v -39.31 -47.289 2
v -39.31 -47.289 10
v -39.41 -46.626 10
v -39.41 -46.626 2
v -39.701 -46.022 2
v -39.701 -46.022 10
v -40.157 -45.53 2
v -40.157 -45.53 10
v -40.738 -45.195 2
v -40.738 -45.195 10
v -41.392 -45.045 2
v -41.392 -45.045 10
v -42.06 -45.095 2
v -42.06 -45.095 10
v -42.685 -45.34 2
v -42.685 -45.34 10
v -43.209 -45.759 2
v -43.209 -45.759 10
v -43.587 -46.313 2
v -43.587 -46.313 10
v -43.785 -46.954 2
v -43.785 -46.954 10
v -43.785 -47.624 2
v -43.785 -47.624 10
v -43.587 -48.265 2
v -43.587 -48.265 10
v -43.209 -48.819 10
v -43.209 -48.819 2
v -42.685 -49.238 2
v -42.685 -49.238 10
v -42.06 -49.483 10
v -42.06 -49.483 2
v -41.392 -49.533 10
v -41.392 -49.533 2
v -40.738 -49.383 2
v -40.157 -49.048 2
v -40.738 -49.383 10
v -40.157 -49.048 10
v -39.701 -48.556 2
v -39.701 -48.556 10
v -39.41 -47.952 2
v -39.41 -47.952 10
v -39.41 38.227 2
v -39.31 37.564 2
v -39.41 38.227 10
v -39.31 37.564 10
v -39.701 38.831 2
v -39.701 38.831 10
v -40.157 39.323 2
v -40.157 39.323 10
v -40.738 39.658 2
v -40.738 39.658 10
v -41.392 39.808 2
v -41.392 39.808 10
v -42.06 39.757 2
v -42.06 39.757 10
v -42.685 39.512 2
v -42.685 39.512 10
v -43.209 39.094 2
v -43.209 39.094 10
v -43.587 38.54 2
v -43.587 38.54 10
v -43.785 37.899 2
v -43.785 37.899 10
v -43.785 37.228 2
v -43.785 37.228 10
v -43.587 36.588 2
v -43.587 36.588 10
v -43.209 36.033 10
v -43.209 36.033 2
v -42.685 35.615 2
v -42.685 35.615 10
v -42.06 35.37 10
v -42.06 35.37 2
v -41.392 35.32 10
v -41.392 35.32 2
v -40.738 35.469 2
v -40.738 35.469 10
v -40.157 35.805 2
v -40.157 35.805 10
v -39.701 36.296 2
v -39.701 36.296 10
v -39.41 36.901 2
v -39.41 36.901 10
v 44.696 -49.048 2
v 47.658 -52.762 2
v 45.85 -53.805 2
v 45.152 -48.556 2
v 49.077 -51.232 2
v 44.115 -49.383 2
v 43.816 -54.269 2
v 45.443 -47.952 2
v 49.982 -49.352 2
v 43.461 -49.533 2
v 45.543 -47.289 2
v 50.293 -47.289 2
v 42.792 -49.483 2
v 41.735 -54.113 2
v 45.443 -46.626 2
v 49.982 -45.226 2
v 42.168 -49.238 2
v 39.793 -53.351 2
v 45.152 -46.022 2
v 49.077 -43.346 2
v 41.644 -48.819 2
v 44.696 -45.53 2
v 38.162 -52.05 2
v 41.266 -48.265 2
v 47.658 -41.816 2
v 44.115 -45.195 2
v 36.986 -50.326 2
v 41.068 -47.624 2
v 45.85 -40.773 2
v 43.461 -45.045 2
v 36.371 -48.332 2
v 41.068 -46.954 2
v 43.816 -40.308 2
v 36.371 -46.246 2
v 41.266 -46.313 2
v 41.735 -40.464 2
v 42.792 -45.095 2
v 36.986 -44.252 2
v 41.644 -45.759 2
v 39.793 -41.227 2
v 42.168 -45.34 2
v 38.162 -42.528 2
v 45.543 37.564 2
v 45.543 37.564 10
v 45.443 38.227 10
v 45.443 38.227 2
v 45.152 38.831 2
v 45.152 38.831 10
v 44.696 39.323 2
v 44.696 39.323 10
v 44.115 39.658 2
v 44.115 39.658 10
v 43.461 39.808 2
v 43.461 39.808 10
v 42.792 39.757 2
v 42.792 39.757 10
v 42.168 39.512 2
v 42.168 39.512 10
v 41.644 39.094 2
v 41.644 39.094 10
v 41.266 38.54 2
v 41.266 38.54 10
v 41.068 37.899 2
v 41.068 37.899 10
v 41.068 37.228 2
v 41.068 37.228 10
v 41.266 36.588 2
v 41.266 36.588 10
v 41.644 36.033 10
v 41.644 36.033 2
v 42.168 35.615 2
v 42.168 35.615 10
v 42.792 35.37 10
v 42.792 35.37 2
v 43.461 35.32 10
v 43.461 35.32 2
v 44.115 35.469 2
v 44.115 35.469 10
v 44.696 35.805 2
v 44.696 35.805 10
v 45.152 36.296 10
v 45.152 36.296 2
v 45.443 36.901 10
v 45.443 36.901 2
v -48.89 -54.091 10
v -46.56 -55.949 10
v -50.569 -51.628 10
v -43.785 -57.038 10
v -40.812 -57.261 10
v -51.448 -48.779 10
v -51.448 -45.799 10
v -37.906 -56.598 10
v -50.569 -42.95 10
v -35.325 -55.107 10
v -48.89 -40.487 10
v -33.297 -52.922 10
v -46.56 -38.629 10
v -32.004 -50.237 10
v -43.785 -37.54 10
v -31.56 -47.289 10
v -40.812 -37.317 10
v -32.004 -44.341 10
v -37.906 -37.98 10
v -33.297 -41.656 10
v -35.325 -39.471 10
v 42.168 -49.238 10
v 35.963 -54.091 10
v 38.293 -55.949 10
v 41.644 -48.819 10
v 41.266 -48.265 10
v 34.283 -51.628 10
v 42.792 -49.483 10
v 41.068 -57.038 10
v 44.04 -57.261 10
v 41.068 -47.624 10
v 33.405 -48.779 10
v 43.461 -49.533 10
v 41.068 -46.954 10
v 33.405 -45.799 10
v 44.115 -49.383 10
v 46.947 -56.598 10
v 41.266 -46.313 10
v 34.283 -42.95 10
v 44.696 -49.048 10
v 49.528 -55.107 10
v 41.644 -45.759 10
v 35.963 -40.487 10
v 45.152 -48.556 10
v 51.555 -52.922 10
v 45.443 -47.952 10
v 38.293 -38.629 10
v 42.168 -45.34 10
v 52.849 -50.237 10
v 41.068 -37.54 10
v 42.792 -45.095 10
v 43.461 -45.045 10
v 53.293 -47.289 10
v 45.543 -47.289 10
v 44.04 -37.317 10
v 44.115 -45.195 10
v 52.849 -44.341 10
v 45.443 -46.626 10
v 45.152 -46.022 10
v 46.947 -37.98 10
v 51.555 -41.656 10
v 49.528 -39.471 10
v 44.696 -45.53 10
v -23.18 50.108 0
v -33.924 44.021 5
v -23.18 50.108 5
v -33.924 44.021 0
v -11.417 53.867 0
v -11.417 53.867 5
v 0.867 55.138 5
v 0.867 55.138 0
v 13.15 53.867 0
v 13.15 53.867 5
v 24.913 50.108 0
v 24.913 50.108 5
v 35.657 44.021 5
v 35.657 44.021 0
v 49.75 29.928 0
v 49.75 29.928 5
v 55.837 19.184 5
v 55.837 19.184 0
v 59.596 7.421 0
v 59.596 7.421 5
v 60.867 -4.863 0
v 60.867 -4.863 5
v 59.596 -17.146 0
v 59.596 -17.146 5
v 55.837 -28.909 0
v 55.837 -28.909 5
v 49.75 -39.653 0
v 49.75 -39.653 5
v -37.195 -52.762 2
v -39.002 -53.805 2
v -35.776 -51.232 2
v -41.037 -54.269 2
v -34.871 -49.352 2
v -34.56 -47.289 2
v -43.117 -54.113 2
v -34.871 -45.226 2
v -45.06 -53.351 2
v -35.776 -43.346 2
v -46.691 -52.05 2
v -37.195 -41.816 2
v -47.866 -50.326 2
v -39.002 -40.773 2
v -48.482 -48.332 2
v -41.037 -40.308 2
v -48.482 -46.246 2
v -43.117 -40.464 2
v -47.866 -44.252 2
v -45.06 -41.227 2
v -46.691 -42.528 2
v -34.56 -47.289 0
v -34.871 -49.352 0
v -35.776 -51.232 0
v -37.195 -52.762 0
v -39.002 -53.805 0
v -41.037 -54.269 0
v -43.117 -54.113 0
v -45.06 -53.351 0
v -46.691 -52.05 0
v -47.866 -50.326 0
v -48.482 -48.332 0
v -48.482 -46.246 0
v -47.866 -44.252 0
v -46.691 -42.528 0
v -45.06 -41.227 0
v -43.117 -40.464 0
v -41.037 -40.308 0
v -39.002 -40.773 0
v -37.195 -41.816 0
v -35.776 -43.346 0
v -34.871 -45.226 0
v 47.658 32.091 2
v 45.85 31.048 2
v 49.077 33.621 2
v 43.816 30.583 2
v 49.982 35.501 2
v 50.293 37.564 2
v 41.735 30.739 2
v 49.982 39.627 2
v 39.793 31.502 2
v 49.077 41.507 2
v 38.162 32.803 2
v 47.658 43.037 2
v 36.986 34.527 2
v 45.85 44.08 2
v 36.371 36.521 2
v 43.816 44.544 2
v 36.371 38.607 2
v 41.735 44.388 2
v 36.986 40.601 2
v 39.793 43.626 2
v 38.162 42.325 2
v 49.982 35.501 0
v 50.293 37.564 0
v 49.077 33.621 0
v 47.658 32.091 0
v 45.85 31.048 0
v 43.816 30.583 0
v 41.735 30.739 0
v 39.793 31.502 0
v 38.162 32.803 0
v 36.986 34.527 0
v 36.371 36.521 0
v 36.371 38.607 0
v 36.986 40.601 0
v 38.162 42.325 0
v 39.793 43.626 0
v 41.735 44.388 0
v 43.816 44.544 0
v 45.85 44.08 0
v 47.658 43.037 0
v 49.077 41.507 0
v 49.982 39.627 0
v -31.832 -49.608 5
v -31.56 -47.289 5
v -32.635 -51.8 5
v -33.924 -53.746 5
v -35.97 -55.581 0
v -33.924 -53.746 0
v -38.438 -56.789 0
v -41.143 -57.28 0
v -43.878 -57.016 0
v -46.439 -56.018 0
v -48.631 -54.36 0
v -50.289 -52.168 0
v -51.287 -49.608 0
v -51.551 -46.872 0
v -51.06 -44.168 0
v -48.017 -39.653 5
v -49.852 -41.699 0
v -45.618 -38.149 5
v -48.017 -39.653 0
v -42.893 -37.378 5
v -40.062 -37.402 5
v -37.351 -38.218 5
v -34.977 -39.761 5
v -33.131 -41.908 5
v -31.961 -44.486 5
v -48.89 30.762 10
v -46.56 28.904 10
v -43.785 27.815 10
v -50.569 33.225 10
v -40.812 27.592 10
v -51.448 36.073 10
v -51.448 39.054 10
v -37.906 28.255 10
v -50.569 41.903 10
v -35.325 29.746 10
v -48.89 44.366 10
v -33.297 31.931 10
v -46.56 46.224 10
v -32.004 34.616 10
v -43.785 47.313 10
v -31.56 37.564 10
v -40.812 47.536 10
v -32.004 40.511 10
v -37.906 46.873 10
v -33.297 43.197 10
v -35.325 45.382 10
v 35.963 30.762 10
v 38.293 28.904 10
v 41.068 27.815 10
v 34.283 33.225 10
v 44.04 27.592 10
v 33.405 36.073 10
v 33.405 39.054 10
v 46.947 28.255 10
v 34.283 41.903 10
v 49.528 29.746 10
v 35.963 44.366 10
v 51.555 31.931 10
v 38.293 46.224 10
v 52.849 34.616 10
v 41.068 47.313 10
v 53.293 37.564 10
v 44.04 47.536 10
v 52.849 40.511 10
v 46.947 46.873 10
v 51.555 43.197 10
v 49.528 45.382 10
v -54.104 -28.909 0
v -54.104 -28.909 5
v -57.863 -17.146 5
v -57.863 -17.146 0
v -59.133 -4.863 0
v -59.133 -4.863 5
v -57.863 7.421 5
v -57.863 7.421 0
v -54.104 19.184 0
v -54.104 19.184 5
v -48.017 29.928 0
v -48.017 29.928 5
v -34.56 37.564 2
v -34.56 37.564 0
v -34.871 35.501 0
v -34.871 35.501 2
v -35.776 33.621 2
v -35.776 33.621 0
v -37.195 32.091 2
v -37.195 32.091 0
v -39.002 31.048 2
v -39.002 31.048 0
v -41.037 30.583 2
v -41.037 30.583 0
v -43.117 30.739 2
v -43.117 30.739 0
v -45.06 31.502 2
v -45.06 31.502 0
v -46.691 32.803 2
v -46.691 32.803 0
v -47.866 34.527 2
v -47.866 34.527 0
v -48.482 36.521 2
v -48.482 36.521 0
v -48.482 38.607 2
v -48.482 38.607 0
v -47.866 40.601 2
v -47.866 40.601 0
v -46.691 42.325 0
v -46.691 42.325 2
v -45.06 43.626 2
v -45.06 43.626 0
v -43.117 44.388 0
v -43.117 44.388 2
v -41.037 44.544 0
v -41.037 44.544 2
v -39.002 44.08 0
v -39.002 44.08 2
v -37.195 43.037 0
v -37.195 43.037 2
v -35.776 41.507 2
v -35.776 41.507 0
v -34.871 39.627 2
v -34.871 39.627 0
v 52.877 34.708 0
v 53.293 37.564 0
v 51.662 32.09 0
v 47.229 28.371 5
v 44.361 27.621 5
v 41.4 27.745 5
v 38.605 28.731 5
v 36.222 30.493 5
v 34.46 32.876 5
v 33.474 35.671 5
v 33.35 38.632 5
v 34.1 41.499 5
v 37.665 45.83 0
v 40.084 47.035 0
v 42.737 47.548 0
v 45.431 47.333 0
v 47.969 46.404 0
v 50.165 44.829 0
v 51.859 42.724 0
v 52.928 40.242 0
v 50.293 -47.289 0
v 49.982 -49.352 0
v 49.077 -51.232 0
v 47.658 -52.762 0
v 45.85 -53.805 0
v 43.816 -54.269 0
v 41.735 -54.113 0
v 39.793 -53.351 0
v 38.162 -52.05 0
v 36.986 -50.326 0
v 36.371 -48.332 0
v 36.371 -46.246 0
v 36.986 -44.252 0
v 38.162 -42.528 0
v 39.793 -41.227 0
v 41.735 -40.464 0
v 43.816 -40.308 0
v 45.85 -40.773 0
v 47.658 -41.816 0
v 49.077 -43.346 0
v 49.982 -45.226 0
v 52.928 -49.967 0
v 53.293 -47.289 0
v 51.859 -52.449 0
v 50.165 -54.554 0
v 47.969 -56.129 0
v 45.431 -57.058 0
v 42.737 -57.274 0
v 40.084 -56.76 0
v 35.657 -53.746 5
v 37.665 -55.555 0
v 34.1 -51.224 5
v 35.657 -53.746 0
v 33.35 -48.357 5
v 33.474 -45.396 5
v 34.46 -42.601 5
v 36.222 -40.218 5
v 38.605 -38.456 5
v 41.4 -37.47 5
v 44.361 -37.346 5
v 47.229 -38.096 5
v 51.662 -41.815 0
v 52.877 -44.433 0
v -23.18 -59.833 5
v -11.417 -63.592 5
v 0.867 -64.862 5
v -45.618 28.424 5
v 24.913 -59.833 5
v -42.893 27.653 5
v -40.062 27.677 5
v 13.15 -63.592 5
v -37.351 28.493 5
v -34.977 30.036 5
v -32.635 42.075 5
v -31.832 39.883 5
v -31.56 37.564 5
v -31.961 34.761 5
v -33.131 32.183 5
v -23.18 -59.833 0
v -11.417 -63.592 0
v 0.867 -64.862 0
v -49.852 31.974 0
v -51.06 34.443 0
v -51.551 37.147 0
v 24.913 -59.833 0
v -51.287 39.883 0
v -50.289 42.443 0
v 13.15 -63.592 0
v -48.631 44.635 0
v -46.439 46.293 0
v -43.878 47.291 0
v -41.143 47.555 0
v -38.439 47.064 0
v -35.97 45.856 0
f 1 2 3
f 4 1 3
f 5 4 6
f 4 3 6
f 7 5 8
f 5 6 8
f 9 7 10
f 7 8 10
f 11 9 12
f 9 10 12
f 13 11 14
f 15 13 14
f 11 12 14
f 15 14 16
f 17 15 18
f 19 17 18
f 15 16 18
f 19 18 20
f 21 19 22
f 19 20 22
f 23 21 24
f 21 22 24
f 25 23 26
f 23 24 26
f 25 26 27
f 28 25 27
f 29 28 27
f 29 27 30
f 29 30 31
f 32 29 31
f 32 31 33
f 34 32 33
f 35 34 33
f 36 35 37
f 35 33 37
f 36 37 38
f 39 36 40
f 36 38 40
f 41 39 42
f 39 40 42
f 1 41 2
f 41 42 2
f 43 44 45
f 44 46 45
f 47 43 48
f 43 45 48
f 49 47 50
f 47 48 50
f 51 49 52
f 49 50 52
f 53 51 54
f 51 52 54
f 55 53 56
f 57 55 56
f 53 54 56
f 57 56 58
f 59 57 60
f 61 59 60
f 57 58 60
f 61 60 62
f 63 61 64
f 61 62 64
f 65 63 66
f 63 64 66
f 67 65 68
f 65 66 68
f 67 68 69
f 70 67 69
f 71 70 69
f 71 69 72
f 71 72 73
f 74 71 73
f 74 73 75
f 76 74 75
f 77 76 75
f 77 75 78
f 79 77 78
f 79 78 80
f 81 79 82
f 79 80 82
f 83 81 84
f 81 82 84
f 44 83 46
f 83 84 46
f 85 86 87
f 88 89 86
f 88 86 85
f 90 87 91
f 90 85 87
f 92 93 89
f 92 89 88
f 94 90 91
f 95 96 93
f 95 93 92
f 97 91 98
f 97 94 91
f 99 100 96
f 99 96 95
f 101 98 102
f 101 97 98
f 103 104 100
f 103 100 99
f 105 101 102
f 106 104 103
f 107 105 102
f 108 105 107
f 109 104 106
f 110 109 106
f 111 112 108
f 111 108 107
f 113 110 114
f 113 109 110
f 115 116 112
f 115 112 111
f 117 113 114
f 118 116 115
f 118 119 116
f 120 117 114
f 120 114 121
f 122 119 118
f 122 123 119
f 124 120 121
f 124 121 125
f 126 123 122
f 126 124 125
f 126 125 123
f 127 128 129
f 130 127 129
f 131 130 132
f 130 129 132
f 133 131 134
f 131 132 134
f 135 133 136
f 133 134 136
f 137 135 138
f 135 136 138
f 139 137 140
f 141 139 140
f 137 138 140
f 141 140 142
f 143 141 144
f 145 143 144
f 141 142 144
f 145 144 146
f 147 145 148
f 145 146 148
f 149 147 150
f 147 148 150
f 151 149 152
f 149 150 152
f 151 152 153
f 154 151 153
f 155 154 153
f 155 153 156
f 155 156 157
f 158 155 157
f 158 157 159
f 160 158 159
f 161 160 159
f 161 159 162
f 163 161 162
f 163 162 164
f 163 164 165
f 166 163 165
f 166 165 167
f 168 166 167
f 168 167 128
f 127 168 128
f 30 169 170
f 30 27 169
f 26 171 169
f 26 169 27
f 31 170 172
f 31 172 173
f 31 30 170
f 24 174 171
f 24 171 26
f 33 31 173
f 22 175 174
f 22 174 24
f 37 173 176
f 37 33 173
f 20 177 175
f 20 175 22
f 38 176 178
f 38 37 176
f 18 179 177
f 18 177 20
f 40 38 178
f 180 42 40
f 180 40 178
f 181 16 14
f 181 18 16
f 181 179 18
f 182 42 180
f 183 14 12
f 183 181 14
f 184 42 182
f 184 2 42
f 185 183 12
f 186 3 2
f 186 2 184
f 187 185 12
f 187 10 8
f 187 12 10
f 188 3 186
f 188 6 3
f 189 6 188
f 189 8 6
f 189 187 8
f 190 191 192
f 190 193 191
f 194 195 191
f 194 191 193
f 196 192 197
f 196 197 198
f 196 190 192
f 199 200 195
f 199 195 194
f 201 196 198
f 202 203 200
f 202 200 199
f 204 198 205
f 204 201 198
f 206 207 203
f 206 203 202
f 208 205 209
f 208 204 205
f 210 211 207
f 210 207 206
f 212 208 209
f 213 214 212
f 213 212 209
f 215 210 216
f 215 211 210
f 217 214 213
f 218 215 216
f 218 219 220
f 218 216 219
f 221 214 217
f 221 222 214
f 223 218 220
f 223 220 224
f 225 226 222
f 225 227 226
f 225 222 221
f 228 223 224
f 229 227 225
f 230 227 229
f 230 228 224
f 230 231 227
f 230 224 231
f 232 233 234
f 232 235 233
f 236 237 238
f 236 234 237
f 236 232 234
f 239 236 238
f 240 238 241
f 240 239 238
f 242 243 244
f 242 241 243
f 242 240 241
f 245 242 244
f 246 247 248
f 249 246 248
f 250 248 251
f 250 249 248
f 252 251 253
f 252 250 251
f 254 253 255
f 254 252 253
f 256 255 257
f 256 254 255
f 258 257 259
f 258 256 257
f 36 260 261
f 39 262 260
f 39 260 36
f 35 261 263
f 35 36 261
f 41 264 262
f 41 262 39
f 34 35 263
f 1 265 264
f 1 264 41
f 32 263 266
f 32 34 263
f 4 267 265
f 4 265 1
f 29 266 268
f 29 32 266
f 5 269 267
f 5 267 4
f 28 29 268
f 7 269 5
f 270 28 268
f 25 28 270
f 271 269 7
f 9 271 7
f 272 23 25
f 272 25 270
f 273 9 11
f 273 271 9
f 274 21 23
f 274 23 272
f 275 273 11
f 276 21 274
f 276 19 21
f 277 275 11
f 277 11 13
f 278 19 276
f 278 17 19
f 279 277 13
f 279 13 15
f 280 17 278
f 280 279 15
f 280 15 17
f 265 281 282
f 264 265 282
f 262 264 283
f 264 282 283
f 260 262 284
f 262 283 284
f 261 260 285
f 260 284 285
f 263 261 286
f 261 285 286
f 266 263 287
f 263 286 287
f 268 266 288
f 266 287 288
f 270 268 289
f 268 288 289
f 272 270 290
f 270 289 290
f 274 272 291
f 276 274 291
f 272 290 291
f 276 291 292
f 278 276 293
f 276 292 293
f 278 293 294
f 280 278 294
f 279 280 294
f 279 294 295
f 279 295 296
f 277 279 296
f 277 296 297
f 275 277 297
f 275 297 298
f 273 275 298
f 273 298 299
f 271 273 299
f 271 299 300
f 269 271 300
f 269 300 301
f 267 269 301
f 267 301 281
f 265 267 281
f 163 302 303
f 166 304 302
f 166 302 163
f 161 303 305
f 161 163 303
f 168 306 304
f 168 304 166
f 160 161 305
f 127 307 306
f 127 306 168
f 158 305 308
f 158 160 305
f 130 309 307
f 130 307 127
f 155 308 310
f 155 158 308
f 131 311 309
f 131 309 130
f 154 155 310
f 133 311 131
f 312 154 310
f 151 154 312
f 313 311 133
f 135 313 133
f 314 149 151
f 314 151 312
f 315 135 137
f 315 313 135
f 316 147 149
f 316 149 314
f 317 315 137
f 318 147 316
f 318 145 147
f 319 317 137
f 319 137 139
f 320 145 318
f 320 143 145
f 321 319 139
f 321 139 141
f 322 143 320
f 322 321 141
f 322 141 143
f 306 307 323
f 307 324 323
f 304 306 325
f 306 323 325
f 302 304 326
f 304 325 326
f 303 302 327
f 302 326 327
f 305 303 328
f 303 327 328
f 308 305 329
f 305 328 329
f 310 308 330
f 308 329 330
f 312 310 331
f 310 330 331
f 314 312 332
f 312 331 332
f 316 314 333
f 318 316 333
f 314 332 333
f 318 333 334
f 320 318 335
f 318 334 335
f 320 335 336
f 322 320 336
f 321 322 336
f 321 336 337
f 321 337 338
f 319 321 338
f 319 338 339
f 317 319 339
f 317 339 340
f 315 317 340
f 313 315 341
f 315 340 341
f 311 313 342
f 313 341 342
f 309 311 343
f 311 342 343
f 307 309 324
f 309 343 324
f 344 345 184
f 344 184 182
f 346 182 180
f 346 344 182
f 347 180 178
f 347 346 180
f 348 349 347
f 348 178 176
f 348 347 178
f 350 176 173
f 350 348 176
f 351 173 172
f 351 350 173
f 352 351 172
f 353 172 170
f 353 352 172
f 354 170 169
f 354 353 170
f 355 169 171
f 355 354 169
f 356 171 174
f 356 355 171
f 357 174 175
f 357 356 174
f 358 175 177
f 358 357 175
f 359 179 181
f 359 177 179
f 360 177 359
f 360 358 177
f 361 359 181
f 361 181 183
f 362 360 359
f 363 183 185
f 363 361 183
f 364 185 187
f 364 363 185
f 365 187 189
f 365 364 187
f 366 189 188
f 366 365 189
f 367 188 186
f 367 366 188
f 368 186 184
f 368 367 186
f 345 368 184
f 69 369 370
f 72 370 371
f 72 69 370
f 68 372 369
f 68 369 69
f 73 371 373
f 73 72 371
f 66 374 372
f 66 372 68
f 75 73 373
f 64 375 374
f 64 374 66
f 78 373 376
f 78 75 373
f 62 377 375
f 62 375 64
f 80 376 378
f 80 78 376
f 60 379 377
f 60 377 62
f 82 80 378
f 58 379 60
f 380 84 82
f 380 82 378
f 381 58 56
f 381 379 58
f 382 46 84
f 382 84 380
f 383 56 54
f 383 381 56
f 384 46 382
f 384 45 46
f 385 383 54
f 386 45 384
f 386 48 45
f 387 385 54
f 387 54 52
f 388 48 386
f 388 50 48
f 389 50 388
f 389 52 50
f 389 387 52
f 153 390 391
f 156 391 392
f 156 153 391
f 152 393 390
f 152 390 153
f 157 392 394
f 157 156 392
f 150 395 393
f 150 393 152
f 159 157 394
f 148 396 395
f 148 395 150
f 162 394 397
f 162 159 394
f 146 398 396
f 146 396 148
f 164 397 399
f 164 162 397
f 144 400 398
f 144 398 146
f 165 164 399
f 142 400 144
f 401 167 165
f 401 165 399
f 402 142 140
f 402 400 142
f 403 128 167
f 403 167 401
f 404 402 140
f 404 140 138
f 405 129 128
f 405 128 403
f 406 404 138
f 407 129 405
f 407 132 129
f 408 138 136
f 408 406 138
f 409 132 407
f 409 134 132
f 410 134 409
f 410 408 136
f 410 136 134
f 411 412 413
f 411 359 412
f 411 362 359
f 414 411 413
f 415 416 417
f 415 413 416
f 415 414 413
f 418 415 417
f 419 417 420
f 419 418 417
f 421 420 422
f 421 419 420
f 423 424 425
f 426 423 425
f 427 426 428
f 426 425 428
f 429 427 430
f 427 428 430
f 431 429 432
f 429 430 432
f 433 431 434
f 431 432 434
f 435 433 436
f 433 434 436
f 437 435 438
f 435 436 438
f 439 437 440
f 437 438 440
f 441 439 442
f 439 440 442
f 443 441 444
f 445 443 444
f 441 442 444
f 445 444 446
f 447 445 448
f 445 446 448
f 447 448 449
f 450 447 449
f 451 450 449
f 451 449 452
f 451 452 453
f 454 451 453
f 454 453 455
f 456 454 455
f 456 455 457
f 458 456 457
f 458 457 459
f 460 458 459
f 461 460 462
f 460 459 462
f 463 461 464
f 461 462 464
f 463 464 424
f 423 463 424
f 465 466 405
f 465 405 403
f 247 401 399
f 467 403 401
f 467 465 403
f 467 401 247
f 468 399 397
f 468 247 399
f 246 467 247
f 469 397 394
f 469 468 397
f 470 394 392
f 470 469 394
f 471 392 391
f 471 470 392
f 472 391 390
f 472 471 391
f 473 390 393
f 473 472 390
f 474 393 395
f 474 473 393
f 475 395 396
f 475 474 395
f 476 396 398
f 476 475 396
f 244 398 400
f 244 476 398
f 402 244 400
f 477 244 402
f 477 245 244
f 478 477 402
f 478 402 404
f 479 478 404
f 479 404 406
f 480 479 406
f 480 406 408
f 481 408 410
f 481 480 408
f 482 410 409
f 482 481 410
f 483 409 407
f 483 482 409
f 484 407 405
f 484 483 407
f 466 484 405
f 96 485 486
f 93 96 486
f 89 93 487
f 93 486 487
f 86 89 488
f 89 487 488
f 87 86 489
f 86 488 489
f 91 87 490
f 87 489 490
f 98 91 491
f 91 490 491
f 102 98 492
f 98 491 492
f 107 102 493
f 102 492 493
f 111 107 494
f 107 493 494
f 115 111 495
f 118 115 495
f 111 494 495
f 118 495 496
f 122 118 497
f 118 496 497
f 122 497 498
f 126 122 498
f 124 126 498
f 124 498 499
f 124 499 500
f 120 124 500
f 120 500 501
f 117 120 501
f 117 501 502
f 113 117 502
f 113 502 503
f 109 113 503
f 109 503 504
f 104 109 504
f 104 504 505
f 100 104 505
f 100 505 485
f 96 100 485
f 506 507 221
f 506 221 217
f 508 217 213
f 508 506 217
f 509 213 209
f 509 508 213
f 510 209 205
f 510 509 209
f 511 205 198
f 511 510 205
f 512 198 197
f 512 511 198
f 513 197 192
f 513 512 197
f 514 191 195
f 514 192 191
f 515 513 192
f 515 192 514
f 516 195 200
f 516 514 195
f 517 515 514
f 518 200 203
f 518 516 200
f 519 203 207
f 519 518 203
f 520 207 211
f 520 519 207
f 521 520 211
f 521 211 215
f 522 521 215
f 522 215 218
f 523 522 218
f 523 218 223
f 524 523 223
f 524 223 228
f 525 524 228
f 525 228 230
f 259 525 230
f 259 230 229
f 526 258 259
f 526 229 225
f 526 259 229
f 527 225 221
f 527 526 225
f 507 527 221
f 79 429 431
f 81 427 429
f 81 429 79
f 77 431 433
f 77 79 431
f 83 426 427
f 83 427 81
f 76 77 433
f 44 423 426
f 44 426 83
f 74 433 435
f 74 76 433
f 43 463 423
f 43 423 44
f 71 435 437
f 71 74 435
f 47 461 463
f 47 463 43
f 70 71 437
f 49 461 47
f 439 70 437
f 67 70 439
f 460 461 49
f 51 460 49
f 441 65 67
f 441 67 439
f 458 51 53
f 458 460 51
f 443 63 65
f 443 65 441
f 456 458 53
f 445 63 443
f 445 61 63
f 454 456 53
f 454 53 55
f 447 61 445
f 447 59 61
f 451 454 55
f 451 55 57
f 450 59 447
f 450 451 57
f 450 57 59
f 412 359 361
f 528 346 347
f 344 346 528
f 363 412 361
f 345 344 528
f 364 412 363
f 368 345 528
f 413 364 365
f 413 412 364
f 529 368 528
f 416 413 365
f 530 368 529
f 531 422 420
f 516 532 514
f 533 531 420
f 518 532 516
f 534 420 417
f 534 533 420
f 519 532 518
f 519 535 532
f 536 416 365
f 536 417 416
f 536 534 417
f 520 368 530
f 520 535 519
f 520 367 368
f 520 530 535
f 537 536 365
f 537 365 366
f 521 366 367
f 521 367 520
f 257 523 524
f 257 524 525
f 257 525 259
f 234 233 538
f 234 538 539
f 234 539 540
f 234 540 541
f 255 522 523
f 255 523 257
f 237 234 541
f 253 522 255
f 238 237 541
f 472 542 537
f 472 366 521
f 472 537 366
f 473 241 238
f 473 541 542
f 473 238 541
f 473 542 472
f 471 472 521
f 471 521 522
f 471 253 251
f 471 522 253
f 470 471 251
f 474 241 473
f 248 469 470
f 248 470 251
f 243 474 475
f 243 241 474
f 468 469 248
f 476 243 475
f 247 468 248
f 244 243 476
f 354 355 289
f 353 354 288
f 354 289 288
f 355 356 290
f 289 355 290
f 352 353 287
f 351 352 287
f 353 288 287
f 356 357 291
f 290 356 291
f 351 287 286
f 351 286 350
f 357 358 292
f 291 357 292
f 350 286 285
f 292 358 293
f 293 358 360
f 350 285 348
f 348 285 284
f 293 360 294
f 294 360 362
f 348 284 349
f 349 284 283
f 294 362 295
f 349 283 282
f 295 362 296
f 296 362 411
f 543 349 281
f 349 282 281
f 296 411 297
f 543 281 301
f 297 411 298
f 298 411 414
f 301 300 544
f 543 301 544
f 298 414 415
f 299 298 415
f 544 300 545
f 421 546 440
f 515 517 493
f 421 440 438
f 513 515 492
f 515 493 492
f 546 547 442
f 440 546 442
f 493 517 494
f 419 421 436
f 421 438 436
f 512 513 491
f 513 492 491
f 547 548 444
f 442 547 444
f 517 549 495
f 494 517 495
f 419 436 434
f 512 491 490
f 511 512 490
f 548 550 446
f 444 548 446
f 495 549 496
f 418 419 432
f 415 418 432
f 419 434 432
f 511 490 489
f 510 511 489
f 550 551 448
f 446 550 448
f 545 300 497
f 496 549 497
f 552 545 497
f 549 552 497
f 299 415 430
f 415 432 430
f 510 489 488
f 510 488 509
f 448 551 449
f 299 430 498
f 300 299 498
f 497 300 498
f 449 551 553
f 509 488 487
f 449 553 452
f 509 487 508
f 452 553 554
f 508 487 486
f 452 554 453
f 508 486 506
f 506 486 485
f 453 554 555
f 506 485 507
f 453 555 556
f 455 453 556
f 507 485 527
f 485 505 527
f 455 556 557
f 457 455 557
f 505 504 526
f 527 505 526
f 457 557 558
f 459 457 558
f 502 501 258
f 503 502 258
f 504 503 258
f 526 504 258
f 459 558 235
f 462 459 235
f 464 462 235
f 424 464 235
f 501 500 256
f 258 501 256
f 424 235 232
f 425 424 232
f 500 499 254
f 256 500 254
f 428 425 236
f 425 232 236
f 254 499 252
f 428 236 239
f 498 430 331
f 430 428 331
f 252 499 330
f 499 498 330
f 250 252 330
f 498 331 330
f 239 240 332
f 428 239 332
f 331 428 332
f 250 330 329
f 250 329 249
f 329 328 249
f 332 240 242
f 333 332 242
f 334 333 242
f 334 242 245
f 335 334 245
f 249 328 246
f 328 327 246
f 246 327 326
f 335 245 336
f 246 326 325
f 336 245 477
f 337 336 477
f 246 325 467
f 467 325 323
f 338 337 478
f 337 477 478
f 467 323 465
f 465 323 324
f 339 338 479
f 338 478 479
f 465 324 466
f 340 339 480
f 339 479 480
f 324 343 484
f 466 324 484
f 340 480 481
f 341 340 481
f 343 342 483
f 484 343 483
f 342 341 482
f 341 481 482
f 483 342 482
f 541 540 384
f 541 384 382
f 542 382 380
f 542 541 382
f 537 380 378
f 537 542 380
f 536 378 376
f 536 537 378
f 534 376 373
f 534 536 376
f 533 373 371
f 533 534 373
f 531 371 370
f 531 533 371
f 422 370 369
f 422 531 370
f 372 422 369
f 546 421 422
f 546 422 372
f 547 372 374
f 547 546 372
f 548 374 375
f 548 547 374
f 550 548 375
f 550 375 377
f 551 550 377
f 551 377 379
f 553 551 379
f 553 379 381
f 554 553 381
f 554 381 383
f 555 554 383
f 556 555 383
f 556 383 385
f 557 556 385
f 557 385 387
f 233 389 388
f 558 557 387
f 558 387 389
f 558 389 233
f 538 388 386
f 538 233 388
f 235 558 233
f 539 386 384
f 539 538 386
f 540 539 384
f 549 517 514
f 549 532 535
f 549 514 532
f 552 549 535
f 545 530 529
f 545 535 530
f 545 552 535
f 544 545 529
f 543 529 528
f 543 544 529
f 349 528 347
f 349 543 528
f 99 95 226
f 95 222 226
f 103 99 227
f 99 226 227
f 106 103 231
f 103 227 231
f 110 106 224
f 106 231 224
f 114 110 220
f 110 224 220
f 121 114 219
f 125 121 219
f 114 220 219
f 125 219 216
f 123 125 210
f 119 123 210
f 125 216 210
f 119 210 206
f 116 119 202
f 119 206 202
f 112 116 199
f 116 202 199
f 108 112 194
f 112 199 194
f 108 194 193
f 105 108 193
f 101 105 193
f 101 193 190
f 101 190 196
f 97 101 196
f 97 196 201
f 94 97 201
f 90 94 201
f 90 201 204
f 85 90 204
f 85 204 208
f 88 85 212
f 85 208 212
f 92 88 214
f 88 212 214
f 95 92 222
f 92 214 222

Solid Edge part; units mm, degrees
sketch "Sketch1" plane through (0, 0, 0) normal (0, 0, 1) x (1, 0, 0)
  circle A0 centre (0.8667, -4.8625) radius 60
extrude "Protrusion1" add sketch "Sketch1" along normal blind 5
sketch "Sketch2" plane through (0, 0, 0) normal (0, 0, 1) x (1, 0, 0)
  circle A0 centre (-41.5597, -47.289) radius 10
  circle A1 centre (-41.5597, 37.5639) radius 10
  circle A2 centre (43.2931, -47.289) radius 10
  circle A3 centre (43.2931, 37.5639) radius 10
  dimension "D1" = 120
  dimension "D2" = 20
extrude "ExtrudedProtrusion_2" add sketch "Sketch2" along normal blind 10
sketch "Sketch3" plane through (-41.5597, -47.289, 10) normal (0, 0, 1) x (1, 0, 0)
  circle A0 centre (0, 0) radius 2.25
  circle A1 centre (0, 84.8528) radius 2.25
  circle A2 centre (84.8528, 0) radius 2.25
  circle A3 centre (84.8528, 84.8528) radius 2.25
extrude "Cutout1" cut sketch "Sketch3" against normal up to next
sketch "Sketch4" plane through (0.8667, -4.8625, 0) normal (0, 0, -1) x (1, 0, 0)
  circle A0 centre (-42.4264, -42.4264) radius 7
  circle A1 centre (42.4264, -42.4264) radius 7
  circle A2 centre (42.4264, 42.4264) radius 7
  circle A3 centre (-42.4264, 42.4264) radius 7
extrude "ExtrudedCutout_2" cut sketch "Sketch4" against normal blind 2
